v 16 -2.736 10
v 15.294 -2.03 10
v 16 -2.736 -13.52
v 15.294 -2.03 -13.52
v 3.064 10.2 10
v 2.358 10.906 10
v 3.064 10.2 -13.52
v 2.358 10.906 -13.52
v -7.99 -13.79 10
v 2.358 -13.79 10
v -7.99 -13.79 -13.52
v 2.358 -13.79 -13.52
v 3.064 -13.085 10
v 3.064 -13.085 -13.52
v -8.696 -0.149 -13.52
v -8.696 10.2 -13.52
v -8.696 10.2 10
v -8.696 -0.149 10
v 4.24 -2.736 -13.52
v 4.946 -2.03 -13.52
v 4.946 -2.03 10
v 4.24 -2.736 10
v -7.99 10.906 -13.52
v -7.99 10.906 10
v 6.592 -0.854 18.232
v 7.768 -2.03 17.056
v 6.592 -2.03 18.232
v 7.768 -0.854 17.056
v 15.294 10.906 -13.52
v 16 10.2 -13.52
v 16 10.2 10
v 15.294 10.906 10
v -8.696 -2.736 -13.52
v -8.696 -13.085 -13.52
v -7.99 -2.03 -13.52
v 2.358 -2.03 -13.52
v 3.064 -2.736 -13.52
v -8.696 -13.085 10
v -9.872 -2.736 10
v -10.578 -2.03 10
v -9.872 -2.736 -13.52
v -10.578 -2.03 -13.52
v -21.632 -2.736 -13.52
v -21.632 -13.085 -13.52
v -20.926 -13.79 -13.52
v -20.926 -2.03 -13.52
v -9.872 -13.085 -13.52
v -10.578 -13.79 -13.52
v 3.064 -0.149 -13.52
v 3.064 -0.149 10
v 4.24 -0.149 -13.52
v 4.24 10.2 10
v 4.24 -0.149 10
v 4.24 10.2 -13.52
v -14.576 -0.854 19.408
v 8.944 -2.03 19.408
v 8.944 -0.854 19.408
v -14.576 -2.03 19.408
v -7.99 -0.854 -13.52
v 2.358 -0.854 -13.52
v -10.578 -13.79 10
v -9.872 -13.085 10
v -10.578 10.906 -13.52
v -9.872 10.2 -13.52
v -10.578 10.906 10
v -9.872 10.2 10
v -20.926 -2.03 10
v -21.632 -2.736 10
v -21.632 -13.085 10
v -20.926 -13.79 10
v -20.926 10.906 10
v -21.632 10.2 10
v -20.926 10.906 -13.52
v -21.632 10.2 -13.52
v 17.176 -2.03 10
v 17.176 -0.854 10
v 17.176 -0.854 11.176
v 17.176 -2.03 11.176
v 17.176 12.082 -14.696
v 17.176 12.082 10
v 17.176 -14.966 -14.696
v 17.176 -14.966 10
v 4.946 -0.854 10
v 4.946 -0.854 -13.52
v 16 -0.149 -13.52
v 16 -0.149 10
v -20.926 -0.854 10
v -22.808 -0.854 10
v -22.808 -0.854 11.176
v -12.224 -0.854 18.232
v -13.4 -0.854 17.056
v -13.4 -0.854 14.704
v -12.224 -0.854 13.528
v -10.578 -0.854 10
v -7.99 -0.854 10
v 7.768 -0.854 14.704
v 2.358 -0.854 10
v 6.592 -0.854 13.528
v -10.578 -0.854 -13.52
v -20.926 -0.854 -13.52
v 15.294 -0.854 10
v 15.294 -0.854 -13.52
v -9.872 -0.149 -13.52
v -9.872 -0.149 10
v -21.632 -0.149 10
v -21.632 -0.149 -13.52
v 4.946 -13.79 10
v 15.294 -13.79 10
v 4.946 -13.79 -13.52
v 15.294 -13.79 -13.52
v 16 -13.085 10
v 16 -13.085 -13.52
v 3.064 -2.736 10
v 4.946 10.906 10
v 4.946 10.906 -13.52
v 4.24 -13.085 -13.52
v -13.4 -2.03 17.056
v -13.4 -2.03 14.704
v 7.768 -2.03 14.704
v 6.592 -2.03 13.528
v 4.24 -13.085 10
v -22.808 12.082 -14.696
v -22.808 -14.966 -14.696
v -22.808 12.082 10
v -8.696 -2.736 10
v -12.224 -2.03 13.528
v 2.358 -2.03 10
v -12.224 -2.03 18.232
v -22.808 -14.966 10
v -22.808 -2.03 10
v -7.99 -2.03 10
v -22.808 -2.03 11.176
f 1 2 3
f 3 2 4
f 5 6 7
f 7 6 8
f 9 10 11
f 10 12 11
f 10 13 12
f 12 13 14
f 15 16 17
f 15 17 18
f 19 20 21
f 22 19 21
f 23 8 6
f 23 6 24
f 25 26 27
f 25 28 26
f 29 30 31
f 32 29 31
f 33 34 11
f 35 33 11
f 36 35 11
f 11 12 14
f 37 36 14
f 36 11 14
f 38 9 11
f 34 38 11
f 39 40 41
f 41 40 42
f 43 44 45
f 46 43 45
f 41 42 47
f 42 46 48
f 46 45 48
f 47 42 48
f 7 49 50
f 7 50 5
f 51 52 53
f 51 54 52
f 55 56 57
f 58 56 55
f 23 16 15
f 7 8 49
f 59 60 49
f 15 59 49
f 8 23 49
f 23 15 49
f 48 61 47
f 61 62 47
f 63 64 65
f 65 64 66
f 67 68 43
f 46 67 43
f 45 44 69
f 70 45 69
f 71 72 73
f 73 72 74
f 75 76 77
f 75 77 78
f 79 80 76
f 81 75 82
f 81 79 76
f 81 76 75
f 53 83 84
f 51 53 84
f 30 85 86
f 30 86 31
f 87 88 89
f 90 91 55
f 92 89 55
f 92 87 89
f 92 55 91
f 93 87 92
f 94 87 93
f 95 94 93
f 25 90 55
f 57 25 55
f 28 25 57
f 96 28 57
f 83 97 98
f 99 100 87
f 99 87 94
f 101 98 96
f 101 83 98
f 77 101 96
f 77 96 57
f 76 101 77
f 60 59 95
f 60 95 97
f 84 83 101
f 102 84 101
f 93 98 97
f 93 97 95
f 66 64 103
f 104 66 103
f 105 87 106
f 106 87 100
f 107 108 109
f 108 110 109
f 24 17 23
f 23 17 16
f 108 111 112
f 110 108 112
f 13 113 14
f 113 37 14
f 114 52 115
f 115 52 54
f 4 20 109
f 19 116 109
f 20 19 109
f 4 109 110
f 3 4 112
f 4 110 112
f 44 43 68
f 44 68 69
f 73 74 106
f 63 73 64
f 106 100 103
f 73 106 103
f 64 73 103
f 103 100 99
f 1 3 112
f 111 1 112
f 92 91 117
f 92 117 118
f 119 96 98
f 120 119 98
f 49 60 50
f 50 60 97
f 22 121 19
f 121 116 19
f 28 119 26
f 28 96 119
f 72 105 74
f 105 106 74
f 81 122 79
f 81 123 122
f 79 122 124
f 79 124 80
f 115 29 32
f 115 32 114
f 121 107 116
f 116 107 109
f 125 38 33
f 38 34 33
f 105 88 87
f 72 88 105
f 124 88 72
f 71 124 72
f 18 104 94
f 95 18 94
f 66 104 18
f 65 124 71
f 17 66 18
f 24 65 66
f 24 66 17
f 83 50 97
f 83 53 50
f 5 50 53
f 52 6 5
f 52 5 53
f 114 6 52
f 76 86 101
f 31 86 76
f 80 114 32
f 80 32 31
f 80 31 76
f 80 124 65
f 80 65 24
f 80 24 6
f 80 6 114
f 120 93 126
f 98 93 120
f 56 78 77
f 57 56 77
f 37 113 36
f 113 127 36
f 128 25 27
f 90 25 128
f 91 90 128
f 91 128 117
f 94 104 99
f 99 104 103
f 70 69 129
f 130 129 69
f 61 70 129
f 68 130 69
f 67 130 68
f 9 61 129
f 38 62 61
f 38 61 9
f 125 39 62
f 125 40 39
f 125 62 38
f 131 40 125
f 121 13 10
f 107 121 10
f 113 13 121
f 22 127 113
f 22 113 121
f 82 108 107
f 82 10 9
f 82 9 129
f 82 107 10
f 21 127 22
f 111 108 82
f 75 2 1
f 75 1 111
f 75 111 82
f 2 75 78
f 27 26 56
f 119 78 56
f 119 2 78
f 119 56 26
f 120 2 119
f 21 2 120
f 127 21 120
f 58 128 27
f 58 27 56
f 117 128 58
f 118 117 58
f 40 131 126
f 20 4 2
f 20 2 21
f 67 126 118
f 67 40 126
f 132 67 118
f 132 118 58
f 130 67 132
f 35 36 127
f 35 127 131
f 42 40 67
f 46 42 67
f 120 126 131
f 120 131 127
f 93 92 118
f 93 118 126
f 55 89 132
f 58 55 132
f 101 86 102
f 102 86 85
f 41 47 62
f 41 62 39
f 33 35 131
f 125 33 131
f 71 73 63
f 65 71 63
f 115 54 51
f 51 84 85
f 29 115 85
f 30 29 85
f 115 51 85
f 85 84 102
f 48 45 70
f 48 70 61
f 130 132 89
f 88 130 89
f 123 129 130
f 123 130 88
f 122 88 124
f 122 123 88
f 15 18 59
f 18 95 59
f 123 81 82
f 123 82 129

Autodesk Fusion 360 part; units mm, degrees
sketch "Sketch1" plane through (0, 0, 0) normal (0, 0, 1) x (1, 0, 0)
  line L0 (0, 0) -> (5, 0)
  line L1 (5, 0) -> (5, 5)
  line L2 (5, 5) -> (0, 5)
  line L3 (0, 5) -> (0, 0)
  line L4 (5, 5) -> (5.5, 5) construction
  line L5 (5.5, 5) -> (10.5, 5)
  line L6 (10.5, 5) -> (10.5, 0)
  line L7 (10.5, 0) -> (5.5, 0)
  line L8 (5.5, 0) -> (5.5, 5)
  line L9 (10.5, 5) -> (11, 5) construction
  line L10 (11, 5) -> (16, 5)
  line L11 (16, 5) -> (16, 0)
  line L12 (16, 0) -> (11, 0)
  line L13 (11, 0) -> (11, 5)
  line L14 (0, 5) -> (0, 5.5) construction
  line L15 (0, 5.25) -> (16.5, 5.25) construction
  line L16 (16, 10.5) -> (11, 10.5)
  line L17 (16, 5.5) -> (16, 10.5)
  line L18 (11, 5.5) -> (16, 5.5)
  line L19 (11, 10.5) -> (11, 5.5)
  line L20 (10.5, 5.5) -> (10.5, 10.5)
  line L21 (5.5, 5.5) -> (10.5, 5.5)
  line L22 (10.5, 10.5) -> (5.5, 10.5)
  line L23 (5.5, 10.5) -> (5.5, 5.5)
  line L24 (5, 10.5) -> (5, 5.5)
  line L25 (0, 10.5) -> (5, 10.5)
  line L26 (5, 5.5) -> (0, 5.5)
  line L27 (0, 5.5) -> (0, 10.5)
  line L28 (0, 10.5) -> (-0.5, 10.5) construction
  line L29 (-0.5, 10.5) -> (-0.5, 11) construction
  line L30 (-0.5, 11) -> (16.5, 11)
  line L31 (16.5, 11) -> (16.5, -0.5)
  line L32 (16.5, -0.5) -> (-0.5, -0.5)
  line L33 (-0.5, -0.5) -> (-0.5, 11)
  dimension "d1" = 5
  dimension "d2" = 5
  dimension "d3" = 0.5
  dimension "d4" = 5
  dimension "d5" = 5
  dimension "d6" = 5
  dimension "d7" = 0.5
  dimension "d8" = 0.5
  dimension "d9" = 0.5
  dimension "d10" = 0.5
  dimension "d11" = 17
  dimension "d12" = 11.5
extrude "Extrude1" add sketch "Sketch1" along normal blind 10 makes body 1
chamfer "Chamfer1" distance 0.3 angle 45 23 edges at (0, 5, 5) (0, 10.5, 5) (5.5, 5, 5) (5.5, 10.5, 5) (11, 5, 5) (11, 10.5, 5) (0, 5.5, 5) (0, 0, 5) (5, 0, 5) (5, 5, 5) (11, 0, 5) (16, 5, 5) (16, 10.5, 5) (16, 0, 5) (10.5, 5.5, 5) (16, 5.5, 5) (10.5, 0, 5) (5, 5.5, 5) (5.5, 5.5, 5) (11, 5.5, 5) (10.5, 5, 5) (10.5, 10.5, 5) (5, 10.5, 5) on bodies 1
sketch "Sketch2" plane through (0, 0, 0) normal (0, 0, -1) x (1, 0, 0)
  line L0 (4.7, -5.5) -> (5, -5.8)
  line L1 (5, -5.8) -> (5, -10.2)
  line L2 (5, -10.2) -> (4.7, -10.5)
  line L3 (4.7, -10.5) -> (0.3, -10.5)
  line L4 (0.3, -10.5) -> (0, -10.2)
  line L5 (0, -10.2) -> (0, -5.8)
  line L6 (0, -5.8) -> (0.3, -5.5)
  line L7 (0.3, -5.5) -> (4.7, -5.5)
  line L8 (0, -0.3) -> (0.3, 0)
  line L9 (0.3, 0) -> (4.7, 0)
  line L10 (4.7, 0) -> (5, -0.3)
  line L11 (5, -0.3) -> (5, -4.7)
  line L12 (5, -4.7) -> (4.7, -5)
  line L13 (4.7, -5) -> (0.3, -5)
  line L14 (0.3, -5) -> (0, -4.7)
  line L15 (0, -4.7) -> (0, -0.3)
  line L16 (10.2, 0) -> (10.5, -0.3)
  line L17 (10.5, -0.3) -> (10.5, -4.7)
  line L18 (10.5, -4.7) -> (10.2, -5)
  line L19 (10.2, -5) -> (5.8, -5)
  line L20 (5.8, -5) -> (5.5, -4.7)
  line L21 (5.5, -4.7) -> (5.5, 0)
  line L22 (5.5, 0) -> (10.2, 0)
  line L23 (5.5, -5.8) -> (5.8, -5.5)
  line L24 (5.8, -5.5) -> (10.2, -5.5)
  line L25 (10.2, -5.5) -> (10.5, -5.8)
  line L26 (10.5, -5.8) -> (10.5, -10.2)
  line L27 (10.5, -10.2) -> (10.2, -10.5)
  line L28 (10.2, -10.5) -> (5.8, -10.5)
  line L29 (5.8, -10.5) -> (5.5, -10.2)
  line L30 (5.5, -10.2) -> (5.5, -5.8)
  line L31 (11, -5.8) -> (11.3, -5.5)
  line L32 (11.3, -5.5) -> (15.7, -5.5)
  line L33 (15.7, -5.5) -> (16, -5.8)
  line L34 (16, -5.8) -> (16, -10.2)
  line L35 (16, -10.2) -> (15.7, -10.5)
  line L36 (15.7, -10.5) -> (11.3, -10.5)
  line L37 (11.3, -10.5) -> (11, -10.2)
  line L38 (11, -10.2) -> (11, -5.8)
  line L39 (15.7, 0) -> (16, -0.3)
  line L40 (16, -0.3) -> (16, -4.7)
  line L41 (16, -4.7) -> (15.7, -5)
  line L42 (15.7, -5) -> (11.3, -5)
  line L43 (11.3, -5) -> (11, -4.7)
  line L44 (11, -4.7) -> (11, -0.3)
  line L45 (11, -0.3) -> (11.3, 0)
  line L46 (11.3, 0) -> (15.7, 0)
  line L47 (16.5, 0.5) -> (-0.5, 0.5)
  line L48 (-0.5, 0.5) -> (-0.5, -11)
  line L49 (-0.5, -11) -> (16.5, -11)
  line L50 (16.5, -11) -> (16.5, 0.5)
  line L51 (16.5, -11) -> (-0.5, -11)
  line L52 (-0.5, -11) -> (-0.5, 0.5)
  line L53 (-0.5, 0.5) -> (16.5, 0.5)
  line L54 (16.5, 0.5) -> (16.5, -11)
extrude "Extrude2" add sketch "Sketch2" along normal blind 0.5 contours L0 L1 L2 L3 L4 L5 L6 L7 | L8 L9 L10 L11 L12 L13 L14 L15 | L16 L17 L18 L19 L20 L21 L22 | L23 L24 L25 L26 L27 L28 L29 L30 | L31 L32 L33 L34 L35 L36 L37 L38 | L39 L40 L41 L42 L43 L44 L45 L46 | L47 L48 L49 L50 L51 L52 L53 L54 bodies 1
sketch "Sketch3" plane through (0, 0, 10) normal (0, 0, 1) x (-1, 0, 0)
  line L0 (-4.7, -5.5) -> (-0.3, -5.5)
  line L1 (-0.3, -5.5) -> (0, -5.8)
  line L2 (0, -5.8) -> (0, -10.2)
  line L3 (0, -10.2) -> (-0.3, -10.5)
  line L4 (-0.3, -10.5) -> (-4.7, -10.5)
  line L5 (-4.7, -10.5) -> (-5, -10.2)
  line L6 (-5, -10.2) -> (-5, -5.8)
  line L7 (-5, -5.8) -> (-4.7, -5.5)
  line L8 (0, -0.3) -> (0, -4.7)
  line L9 (0, -4.7) -> (-0.3, -5)
  line L10 (-0.3, -5) -> (-4.7, -5)
  line L11 (-4.7, -5) -> (-5, -4.7)
  line L12 (-5, -4.7) -> (-5, -0.3)
  line L13 (-5, -0.3) -> (-4.7, 0)
  line L14 (-4.7, 0) -> (-0.3, 0)
  line L15 (-0.3, 0) -> (0, -0.3)
  line L16 (-10.2, 0) -> (-5.5, 0)
  line L17 (-5.5, 0) -> (-5.5, -4.7)
  line L18 (-5.5, -4.7) -> (-5.8, -5)
  line L19 (-5.8, -5) -> (-10.2, -5)
  line L20 (-10.2, -5) -> (-10.5, -4.7)
  line L21 (-10.5, -4.7) -> (-10.5, -0.3)
  line L22 (-10.5, -0.3) -> (-10.2, 0)
  line L23 (-5.5, -5.8) -> (-5.5, -10.2)
  line L24 (-5.5, -10.2) -> (-5.8, -10.5)
  line L25 (-5.8, -10.5) -> (-10.2, -10.5)
  line L26 (-10.2, -10.5) -> (-10.5, -10.2)
  line L27 (-10.5, -10.2) -> (-10.5, -5.8)
  line L28 (-10.5, -5.8) -> (-10.2, -5.5)
  line L29 (-10.2, -5.5) -> (-5.8, -5.5)
  line L30 (-5.8, -5.5) -> (-5.5, -5.8)
  line L31 (-11, -5.8) -> (-11, -10.2)
  line L32 (-11, -10.2) -> (-11.3, -10.5)
  line L33 (-11.3, -10.5) -> (-15.7, -10.5)
  line L34 (-15.7, -10.5) -> (-16, -10.2)
  line L35 (-16, -10.2) -> (-16, -5.8)
  line L36 (-16, -5.8) -> (-15.7, -5.5)
  line L37 (-15.7, -5.5) -> (-11.3, -5.5)
  line L38 (-11.3, -5.5) -> (-11, -5.8)
  line L39 (-15.7, 0) -> (-11.3, 0)
  line L40 (-11.3, 0) -> (-11, -0.3)
  line L41 (-11, -0.3) -> (-11, -4.7)
  line L42 (-11, -4.7) -> (-11.3, -5)
  line L43 (-11.3, -5) -> (-15.7, -5)
  line L44 (-15.7, -5) -> (-16, -4.7)
  line L45 (-16, -4.7) -> (-16, -0.3)
  line L46 (-16, -0.3) -> (-15.7, 0)
  line L47 (0.5, 0.5) -> (-16.5, 0.5)
  line L48 (-16.5, 0.5) -> (-16.5, -11)
  line L49 (-16.5, -11) -> (0.5, -11)
  line L50 (0.5, -11) -> (0.5, 0.5)
  line L51 (-16.5, -5) -> (0.5, -5)
  line L52 (0.5, -5) -> (0.5, -5.5)
  line L53 (0.5, -5.5) -> (-16.5, -5.5)
  line L54 (-16.5, -5.5) -> (-16.5, -5)
  dimension "d18" = 17
  dimension "d19" = 0.5
extrude "Extrude3" add sketch "Sketch3" along normal blind 4 contours L0 L10 L19 L29 L37 L43 L48 L50 L51 L52 L53 L54 bodies 1
chamfer "Chamfer2" distance 0.3 angle 45 1 edges at (5.5, 0, 5) on bodies 1
chamfer "Chamfer3" distance 3.5 angle 45 2 edges at (16.5, 5.25, 14) (-0.5, 5.25, 14) on bodies 1
sketch "Sketch4" plane through (0, 5.5, 0) normal (0, 1, 0) x (-1, 0, 0)
  line L0 (0.5, 10.5) -> (-3, 14)
  line L1 (-3, 14) -> (-13, 14)
  line L2 (-13, 14) -> (-16.5, 10.5)
  line L3 (-16.5, 10.5) -> (-16.5, 10)
  line L4 (-16.5, 10) -> (-15.7, 10)
  line L5 (-15.7, 10) -> (-15.7, 0)
  line L6 (-15.7, 0) -> (-11.3, 0)
  line L7 (-11.3, 0) -> (-11.3, 10)
  line L8 (-11.3, 10) -> (-10.2, 10)
  line L9 (-10.2, 10) -> (-10.2, 0)
  line L10 (-10.2, 0) -> (-5.8, 0)
  line L11 (-5.8, 0) -> (-5.8, 10)
  line L12 (-5.8, 10) -> (-4.7, 10)
  line L13 (-4.7, 10) -> (-4.7, 0)
  line L14 (-4.7, 0) -> (-0.3, 0)
  line L15 (-0.3, 0) -> (-0.3, 10)
  line L16 (-0.3, 10) -> (0.5, 10)
  line L17 (0.5, 10) -> (0.5, 10.5)
  line L18 (-12.5, 13.5) -> (-3.5, 13.5)
  line L19 (-12.5, 13.5) -> (-3.5, 13.5)
  line L20 (-3.5, 13.5) -> (-3.5, 11.5)
  line L21 (-3.5, 11.5) -> (-12.5, 11.5)
  line L22 (-12.5, 11.5) -> (-12.5, 13.5)
  line L23 (-12.5, 12) -> (-12, 11.5)
  line L24 (-12.5, 13) -> (-12, 13.5)
  line L25 (-4, 13.5) -> (-3.5, 13)
  line L26 (-3.5, 12) -> (-4, 11.5)
extrude "Extrude4" cut sketch "Sketch4" against normal up to surface (0.5 mm away) contours L18 L19 L20 L21 L22 L23 L24 L25 L26 bodies 1
scale "Scale1" factor 2.352 about (16, 10.2, 10) bodies 1
copy_body "Body->Comp1" bodies 1 removing the originals makes body 2 in component "Component"
component "Component" placed x (1, 0, 0) y (0, 1, 0) z (0, 0, 1) at (0, 0, 0)
